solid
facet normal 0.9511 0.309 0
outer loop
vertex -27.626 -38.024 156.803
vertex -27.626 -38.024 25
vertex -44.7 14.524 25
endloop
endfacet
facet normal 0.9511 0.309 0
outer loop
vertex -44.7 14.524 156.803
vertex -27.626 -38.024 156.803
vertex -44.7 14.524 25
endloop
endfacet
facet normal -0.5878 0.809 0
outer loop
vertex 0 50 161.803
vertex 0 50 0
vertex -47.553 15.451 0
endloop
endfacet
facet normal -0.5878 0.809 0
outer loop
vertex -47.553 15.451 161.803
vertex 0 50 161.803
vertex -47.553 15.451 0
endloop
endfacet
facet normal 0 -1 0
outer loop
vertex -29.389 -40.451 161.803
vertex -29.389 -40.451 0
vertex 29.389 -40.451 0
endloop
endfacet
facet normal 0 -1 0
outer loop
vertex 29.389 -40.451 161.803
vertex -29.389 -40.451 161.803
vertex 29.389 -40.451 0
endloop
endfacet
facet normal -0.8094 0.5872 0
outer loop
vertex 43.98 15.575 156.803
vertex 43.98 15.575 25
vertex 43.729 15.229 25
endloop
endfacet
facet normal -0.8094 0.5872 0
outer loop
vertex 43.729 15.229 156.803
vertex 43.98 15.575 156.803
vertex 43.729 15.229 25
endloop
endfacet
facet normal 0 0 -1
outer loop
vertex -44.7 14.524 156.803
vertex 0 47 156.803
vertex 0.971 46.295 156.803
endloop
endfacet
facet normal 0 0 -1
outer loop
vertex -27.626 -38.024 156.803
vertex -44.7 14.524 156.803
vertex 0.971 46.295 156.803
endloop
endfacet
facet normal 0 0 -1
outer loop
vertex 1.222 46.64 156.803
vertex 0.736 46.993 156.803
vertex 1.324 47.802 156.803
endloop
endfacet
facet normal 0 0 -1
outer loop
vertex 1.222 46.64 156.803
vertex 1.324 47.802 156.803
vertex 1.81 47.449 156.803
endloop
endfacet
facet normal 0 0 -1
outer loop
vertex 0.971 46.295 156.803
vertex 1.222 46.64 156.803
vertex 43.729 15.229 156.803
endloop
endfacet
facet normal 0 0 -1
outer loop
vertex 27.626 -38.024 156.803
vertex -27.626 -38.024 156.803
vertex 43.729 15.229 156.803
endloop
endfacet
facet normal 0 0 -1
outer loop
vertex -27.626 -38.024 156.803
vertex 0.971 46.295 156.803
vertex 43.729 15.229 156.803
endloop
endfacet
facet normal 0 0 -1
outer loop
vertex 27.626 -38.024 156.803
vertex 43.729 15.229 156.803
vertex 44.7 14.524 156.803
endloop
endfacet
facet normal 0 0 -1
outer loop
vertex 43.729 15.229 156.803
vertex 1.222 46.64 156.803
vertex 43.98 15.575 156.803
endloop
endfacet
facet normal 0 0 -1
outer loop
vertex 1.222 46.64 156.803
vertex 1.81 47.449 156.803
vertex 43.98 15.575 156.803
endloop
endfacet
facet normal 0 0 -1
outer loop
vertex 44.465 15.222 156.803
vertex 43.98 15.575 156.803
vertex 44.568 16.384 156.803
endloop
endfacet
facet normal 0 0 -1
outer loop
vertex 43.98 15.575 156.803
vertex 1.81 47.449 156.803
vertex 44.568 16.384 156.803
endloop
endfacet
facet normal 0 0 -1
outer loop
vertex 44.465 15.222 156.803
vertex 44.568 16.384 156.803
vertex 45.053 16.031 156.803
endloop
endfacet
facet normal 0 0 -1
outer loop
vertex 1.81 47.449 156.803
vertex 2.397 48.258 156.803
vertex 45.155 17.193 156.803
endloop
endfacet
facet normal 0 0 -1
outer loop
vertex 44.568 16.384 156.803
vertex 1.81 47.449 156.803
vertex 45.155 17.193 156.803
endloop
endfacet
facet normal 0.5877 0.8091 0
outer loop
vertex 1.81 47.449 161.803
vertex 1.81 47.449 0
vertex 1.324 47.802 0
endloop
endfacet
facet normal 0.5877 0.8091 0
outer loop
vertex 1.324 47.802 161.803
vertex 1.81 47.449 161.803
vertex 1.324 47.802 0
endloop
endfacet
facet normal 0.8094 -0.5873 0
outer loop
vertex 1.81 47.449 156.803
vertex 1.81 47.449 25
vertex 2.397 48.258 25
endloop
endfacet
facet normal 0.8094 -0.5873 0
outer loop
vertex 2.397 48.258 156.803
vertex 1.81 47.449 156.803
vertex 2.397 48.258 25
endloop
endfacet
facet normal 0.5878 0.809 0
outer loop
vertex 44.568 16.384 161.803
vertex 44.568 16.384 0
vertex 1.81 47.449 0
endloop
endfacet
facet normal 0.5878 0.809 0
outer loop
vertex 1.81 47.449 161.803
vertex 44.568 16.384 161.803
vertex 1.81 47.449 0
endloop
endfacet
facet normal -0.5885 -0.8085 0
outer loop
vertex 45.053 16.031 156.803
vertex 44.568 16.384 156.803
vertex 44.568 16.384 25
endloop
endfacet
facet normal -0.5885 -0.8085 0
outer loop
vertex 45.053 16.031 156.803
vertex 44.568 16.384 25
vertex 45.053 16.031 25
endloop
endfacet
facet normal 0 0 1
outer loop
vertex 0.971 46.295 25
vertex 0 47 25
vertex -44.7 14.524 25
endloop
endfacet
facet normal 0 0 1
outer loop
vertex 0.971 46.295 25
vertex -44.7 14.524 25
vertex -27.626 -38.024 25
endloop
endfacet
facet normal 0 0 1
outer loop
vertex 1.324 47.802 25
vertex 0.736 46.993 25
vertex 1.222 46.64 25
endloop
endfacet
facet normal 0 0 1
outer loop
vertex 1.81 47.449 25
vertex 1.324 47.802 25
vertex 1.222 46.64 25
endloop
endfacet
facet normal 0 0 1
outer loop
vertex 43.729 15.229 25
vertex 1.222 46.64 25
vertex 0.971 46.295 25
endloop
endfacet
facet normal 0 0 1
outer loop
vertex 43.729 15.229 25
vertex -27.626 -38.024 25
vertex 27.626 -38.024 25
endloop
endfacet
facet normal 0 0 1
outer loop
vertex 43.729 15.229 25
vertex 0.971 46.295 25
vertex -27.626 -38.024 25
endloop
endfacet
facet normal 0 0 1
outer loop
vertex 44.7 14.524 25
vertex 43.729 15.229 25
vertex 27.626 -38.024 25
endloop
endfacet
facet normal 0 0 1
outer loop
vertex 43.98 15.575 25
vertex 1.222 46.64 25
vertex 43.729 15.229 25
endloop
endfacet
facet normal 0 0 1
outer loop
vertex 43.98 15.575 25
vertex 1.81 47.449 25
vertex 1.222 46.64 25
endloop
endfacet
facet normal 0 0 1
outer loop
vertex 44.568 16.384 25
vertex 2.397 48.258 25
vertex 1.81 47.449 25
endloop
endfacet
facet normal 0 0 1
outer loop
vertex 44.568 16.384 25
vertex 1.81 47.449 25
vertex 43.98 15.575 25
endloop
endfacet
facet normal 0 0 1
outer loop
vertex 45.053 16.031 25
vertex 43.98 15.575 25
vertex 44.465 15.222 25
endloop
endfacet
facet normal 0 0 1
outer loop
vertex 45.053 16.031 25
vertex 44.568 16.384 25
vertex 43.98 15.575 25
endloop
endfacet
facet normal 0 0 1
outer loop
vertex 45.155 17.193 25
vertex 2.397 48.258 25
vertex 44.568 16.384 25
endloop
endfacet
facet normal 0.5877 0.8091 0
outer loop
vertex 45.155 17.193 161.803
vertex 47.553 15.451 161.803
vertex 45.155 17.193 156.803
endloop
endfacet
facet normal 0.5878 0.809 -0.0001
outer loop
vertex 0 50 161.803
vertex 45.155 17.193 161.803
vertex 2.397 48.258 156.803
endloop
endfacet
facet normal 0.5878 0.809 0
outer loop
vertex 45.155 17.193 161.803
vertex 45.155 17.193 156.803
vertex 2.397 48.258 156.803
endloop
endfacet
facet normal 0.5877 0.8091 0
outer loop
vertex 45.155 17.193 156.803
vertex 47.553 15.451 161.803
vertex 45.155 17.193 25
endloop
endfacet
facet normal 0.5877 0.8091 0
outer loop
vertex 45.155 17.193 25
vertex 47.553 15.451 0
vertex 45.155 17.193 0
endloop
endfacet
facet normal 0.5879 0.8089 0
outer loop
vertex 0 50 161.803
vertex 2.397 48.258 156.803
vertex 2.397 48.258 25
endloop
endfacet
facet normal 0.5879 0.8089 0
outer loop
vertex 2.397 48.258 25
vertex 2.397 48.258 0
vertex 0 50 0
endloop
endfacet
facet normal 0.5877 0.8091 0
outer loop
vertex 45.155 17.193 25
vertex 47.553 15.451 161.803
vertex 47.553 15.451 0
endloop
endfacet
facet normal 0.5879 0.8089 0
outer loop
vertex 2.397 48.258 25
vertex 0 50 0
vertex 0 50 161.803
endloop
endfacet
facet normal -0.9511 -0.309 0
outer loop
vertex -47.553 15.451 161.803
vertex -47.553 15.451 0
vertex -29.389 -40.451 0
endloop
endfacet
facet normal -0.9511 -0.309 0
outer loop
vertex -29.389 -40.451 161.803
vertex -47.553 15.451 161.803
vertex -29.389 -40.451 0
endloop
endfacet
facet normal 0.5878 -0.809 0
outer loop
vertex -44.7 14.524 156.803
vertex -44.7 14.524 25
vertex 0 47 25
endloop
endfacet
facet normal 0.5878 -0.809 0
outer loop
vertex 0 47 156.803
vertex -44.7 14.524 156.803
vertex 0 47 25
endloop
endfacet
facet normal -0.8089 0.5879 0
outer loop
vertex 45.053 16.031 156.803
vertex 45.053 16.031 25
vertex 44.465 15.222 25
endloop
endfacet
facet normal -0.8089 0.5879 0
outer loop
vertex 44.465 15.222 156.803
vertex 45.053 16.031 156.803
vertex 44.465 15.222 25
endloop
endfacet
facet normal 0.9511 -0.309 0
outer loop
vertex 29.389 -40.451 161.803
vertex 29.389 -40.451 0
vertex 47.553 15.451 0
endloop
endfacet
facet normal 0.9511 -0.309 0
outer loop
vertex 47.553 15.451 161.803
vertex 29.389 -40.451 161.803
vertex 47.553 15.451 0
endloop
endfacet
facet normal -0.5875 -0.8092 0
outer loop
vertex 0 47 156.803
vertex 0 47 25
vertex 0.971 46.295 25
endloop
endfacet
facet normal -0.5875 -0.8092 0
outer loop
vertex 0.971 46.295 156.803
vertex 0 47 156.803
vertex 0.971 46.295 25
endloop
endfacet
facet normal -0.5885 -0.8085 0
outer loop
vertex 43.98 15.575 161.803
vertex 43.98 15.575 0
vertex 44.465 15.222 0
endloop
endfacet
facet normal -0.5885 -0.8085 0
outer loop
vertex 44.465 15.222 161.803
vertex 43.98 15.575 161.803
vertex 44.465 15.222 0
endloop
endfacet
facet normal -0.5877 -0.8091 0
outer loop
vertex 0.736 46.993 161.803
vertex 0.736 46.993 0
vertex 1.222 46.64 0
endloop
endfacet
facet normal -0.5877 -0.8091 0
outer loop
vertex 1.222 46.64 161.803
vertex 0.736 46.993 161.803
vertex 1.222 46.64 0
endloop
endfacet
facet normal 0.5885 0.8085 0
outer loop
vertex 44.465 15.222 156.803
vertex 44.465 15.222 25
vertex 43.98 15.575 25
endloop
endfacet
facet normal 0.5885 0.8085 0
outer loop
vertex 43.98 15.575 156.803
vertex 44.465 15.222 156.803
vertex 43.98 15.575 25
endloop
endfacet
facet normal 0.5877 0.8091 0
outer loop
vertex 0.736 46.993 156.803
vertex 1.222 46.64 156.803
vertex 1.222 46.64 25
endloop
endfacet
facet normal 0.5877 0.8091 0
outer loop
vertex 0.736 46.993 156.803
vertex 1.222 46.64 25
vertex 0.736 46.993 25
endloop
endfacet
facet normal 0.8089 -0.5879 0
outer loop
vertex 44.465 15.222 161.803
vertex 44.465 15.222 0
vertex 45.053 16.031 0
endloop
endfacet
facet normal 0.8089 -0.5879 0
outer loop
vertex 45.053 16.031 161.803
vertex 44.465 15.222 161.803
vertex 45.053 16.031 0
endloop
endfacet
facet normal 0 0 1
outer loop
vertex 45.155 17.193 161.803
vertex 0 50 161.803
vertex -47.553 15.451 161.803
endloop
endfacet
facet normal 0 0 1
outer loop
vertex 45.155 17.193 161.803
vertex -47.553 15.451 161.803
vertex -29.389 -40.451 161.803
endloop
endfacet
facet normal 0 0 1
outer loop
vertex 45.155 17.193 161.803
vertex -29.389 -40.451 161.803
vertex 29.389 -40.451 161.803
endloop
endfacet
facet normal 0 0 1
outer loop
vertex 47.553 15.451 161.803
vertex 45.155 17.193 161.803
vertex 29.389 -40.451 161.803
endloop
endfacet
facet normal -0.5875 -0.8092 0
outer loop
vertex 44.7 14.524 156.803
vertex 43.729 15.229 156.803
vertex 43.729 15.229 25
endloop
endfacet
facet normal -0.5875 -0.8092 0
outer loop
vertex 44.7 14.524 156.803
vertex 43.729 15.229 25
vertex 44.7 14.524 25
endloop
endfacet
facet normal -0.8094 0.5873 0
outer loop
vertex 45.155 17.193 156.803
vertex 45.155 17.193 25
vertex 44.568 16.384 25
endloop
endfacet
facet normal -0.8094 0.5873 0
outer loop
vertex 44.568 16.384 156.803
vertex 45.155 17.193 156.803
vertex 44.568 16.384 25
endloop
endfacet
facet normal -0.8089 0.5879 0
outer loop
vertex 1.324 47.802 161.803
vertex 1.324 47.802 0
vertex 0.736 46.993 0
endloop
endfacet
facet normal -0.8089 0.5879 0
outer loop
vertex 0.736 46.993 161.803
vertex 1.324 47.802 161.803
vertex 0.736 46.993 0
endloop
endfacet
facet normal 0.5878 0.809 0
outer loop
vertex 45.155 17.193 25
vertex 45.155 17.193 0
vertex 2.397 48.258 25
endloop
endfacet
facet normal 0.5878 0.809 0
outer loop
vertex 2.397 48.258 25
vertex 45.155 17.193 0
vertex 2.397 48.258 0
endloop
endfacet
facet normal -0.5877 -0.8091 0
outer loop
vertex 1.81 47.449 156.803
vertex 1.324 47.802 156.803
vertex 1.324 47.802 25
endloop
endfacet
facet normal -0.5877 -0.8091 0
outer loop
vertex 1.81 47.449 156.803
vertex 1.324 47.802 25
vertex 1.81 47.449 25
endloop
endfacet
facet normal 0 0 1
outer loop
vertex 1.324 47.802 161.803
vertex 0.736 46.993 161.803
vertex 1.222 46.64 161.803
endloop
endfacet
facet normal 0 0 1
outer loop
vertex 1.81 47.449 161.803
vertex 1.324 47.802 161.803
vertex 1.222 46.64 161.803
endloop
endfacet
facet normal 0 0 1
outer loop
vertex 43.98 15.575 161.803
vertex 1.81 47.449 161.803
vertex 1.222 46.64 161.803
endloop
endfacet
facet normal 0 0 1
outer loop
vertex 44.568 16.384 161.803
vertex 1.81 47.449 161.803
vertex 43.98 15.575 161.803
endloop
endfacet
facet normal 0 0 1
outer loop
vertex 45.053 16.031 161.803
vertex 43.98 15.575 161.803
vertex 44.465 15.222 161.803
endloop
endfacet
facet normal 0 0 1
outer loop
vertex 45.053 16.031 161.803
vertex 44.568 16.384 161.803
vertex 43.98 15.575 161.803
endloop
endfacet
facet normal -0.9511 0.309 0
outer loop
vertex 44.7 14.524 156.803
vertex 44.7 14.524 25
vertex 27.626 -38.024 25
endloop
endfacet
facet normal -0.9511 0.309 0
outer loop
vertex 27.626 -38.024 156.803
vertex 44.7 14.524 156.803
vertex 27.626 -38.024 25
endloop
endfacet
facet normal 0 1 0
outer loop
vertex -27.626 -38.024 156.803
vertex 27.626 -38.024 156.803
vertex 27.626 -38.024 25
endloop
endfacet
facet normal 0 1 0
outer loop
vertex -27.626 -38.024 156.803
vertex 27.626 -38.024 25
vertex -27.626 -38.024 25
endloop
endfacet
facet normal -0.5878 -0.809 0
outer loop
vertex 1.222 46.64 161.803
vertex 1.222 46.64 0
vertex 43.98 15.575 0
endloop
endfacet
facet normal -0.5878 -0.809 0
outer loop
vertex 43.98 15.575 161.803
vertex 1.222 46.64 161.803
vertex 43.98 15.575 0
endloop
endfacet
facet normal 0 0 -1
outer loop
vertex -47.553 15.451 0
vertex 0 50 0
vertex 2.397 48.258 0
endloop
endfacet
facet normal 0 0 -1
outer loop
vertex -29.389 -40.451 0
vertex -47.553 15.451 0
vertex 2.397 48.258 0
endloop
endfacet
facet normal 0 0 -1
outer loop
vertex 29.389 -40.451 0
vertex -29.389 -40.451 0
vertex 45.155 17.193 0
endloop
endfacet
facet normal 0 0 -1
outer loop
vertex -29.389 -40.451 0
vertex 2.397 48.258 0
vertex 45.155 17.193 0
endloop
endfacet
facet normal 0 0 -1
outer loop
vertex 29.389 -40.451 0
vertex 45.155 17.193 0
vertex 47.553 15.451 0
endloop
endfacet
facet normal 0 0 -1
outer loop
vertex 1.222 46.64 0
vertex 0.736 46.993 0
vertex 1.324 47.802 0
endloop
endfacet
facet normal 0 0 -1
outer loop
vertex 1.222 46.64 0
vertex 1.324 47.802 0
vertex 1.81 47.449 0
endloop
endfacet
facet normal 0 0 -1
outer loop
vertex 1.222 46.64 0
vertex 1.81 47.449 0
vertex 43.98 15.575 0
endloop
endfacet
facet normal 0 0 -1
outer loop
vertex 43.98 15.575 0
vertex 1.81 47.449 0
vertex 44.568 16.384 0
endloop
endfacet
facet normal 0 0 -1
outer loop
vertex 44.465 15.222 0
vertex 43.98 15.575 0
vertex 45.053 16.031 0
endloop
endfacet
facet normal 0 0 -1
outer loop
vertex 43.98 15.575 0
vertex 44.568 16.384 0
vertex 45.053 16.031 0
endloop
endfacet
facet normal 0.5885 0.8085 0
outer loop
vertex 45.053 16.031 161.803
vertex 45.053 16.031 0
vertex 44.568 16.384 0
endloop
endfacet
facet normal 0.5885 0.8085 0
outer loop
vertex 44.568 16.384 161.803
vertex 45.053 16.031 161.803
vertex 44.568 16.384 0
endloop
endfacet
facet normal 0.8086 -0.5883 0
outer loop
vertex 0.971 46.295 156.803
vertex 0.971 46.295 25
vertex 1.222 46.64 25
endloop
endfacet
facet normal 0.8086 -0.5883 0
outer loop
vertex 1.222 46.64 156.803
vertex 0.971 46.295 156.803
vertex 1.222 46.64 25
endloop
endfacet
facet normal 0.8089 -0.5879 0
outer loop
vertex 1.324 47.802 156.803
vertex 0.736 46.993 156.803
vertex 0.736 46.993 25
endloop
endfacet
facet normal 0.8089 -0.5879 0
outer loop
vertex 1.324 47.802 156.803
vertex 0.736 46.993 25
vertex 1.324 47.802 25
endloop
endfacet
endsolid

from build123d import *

# Parameters (mm, degrees)
F4_DEPTH = 161.803
F5_DEPTH = 25
F6_START = 131.803
F6_DEPTH = 5
F7_DEPTH = 161.803


with BuildPart() as f4:
    # F3 (on Top) → F4 (new body)
    with BuildSketch(Plane.XY):
        Polygon((2.3974051677, 48.2581831888), (0, 50), (-47.5528258148, 15.4508497187), (-29.3892626146, -40.4508497187), (29.3892626146, -40.4508497187), (47.5528258148, 15.4508497187), (45.1554206471, 17.1926665299), (44.5676353948, 16.3836495356), (45.0530455914, 16.0309783842), (44.4652603391, 15.2219613898), (43.9798501425, 15.5746325412), (43.7288358726, 15.2291410384), (44.6996562659, 14.5237987356), (27.6259068577, -38.0237987356), (-27.6259068577, -38.0237987356), (-44.6996562659, 14.5237987356), (0, 47), (0.9708203932, 46.2946576972), (1.2218346631, 46.6401492001), (0.7364244665, 46.9928203514), (1.3242097188, 47.8018373458), (1.8096199154, 47.4491661944), align=None)
    extrude(amount=F4_DEPTH)

    # F3 (on Top) → F5 (join)
    with BuildSketch(Plane.XY):
        Polygon((2.3974051677, 48.2581831888), (0, 50), (-47.5528258148, 15.4508497187), (-29.3892626146, -40.4508497187), (29.3892626146, -40.4508497187), (47.5528258148, 15.4508497187), (45.1554206471, 17.1926665299), (44.5676353948, 16.3836495356), (45.0530455914, 16.0309783842), (44.4652603391, 15.2219613898), (43.9798501425, 15.5746325412), (43.7288358726, 15.2291410384), (44.6996562659, 14.5237987356), (27.6259068577, -38.0237987356), (-27.6259068577, -38.0237987356), (-44.6996562659, 14.5237987356), (0, 47), (0.9708203932, 46.2946576972), (1.2218346631, 46.6401492001), (0.7364244665, 46.9928203514), (1.3242097188, 47.8018373458), (1.8096199154, 47.4491661944), align=None)
        Polygon((45.1554206471, 17.1926665299), (2.3974051677, 48.2581831888), (1.8096199154, 47.4491661944), (44.5676353948, 16.3836495356), align=None)
        Polygon((43.7288358726, 15.2291410384), (0.9708203932, 46.2946576972), (0, 47), (-44.6996562659, 14.5237987356), (-27.6259068577, -38.0237987356), (27.6259068577, -38.0237987356), (44.6996562659, 14.5237987356), align=None)
        Polygon((44.5676353948, 16.3836495356), (1.8096199154, 47.4491661944), (1.3242097188, 47.8018373458), (0.7364244665, 46.9928203514), (1.2218346631, 46.6401492001), (43.9798501425, 15.5746325412), (44.4652603391, 15.2219613898), (45.0530455914, 16.0309783842), align=None)
        Polygon((43.9798501425, 15.5746325412), (1.2218346631, 46.6401492001), (0.9708203932, 46.2946576972), (43.7288358726, 15.2291410384), align=None)
    extrude(amount=F5_DEPTH)

    # F5_face (on face) → F6 (join)
    with BuildSketch(Plane(origin=(0.5548214396, 0.7636461986, 25), x_dir=(1, 0, 0), z_dir=(0, 0, 1)).offset(F6_START)):
        Polygon((44.0128139551, 15.6200033369), (44.6005992074, 16.4290203313), (1.8425837281, 47.4945369902), (1.2547984758, 46.6855199958), (0.7693882791, 47.0381911472), (0.1816030268, 46.2291741528), (0.6670132235, 45.8765030014), (0.4159989536, 45.5310114986), (-0.5548214396, 46.2363538014), (-45.2544777055, 13.760152537), (-28.1807282974, -38.7874449342), (27.0710854181, -38.7874449342), (44.1448348262, 13.760152537), (43.174014433, 14.4654948398), (43.4250287028, 14.8109863426), (43.9104388995, 14.4583151912), (44.4982241518, 15.2673321856), align=None)
    extrude(amount=F6_DEPTH)


with BuildPart() as f7:
    # F3 (on Top) → F7 (new body)
    with BuildSketch(Plane.XY):
        Polygon((44.5676353948, 16.3836495356), (1.8096199154, 47.4491661944), (1.3242097188, 47.8018373458), (0.7364244665, 46.9928203514), (1.2218346631, 46.6401492001), (43.9798501425, 15.5746325412), (44.4652603391, 15.2219613898), (45.0530455914, 16.0309783842), align=None)
    extrude(amount=F7_DEPTH)


solid = Compound([f4.part, f7.part])
